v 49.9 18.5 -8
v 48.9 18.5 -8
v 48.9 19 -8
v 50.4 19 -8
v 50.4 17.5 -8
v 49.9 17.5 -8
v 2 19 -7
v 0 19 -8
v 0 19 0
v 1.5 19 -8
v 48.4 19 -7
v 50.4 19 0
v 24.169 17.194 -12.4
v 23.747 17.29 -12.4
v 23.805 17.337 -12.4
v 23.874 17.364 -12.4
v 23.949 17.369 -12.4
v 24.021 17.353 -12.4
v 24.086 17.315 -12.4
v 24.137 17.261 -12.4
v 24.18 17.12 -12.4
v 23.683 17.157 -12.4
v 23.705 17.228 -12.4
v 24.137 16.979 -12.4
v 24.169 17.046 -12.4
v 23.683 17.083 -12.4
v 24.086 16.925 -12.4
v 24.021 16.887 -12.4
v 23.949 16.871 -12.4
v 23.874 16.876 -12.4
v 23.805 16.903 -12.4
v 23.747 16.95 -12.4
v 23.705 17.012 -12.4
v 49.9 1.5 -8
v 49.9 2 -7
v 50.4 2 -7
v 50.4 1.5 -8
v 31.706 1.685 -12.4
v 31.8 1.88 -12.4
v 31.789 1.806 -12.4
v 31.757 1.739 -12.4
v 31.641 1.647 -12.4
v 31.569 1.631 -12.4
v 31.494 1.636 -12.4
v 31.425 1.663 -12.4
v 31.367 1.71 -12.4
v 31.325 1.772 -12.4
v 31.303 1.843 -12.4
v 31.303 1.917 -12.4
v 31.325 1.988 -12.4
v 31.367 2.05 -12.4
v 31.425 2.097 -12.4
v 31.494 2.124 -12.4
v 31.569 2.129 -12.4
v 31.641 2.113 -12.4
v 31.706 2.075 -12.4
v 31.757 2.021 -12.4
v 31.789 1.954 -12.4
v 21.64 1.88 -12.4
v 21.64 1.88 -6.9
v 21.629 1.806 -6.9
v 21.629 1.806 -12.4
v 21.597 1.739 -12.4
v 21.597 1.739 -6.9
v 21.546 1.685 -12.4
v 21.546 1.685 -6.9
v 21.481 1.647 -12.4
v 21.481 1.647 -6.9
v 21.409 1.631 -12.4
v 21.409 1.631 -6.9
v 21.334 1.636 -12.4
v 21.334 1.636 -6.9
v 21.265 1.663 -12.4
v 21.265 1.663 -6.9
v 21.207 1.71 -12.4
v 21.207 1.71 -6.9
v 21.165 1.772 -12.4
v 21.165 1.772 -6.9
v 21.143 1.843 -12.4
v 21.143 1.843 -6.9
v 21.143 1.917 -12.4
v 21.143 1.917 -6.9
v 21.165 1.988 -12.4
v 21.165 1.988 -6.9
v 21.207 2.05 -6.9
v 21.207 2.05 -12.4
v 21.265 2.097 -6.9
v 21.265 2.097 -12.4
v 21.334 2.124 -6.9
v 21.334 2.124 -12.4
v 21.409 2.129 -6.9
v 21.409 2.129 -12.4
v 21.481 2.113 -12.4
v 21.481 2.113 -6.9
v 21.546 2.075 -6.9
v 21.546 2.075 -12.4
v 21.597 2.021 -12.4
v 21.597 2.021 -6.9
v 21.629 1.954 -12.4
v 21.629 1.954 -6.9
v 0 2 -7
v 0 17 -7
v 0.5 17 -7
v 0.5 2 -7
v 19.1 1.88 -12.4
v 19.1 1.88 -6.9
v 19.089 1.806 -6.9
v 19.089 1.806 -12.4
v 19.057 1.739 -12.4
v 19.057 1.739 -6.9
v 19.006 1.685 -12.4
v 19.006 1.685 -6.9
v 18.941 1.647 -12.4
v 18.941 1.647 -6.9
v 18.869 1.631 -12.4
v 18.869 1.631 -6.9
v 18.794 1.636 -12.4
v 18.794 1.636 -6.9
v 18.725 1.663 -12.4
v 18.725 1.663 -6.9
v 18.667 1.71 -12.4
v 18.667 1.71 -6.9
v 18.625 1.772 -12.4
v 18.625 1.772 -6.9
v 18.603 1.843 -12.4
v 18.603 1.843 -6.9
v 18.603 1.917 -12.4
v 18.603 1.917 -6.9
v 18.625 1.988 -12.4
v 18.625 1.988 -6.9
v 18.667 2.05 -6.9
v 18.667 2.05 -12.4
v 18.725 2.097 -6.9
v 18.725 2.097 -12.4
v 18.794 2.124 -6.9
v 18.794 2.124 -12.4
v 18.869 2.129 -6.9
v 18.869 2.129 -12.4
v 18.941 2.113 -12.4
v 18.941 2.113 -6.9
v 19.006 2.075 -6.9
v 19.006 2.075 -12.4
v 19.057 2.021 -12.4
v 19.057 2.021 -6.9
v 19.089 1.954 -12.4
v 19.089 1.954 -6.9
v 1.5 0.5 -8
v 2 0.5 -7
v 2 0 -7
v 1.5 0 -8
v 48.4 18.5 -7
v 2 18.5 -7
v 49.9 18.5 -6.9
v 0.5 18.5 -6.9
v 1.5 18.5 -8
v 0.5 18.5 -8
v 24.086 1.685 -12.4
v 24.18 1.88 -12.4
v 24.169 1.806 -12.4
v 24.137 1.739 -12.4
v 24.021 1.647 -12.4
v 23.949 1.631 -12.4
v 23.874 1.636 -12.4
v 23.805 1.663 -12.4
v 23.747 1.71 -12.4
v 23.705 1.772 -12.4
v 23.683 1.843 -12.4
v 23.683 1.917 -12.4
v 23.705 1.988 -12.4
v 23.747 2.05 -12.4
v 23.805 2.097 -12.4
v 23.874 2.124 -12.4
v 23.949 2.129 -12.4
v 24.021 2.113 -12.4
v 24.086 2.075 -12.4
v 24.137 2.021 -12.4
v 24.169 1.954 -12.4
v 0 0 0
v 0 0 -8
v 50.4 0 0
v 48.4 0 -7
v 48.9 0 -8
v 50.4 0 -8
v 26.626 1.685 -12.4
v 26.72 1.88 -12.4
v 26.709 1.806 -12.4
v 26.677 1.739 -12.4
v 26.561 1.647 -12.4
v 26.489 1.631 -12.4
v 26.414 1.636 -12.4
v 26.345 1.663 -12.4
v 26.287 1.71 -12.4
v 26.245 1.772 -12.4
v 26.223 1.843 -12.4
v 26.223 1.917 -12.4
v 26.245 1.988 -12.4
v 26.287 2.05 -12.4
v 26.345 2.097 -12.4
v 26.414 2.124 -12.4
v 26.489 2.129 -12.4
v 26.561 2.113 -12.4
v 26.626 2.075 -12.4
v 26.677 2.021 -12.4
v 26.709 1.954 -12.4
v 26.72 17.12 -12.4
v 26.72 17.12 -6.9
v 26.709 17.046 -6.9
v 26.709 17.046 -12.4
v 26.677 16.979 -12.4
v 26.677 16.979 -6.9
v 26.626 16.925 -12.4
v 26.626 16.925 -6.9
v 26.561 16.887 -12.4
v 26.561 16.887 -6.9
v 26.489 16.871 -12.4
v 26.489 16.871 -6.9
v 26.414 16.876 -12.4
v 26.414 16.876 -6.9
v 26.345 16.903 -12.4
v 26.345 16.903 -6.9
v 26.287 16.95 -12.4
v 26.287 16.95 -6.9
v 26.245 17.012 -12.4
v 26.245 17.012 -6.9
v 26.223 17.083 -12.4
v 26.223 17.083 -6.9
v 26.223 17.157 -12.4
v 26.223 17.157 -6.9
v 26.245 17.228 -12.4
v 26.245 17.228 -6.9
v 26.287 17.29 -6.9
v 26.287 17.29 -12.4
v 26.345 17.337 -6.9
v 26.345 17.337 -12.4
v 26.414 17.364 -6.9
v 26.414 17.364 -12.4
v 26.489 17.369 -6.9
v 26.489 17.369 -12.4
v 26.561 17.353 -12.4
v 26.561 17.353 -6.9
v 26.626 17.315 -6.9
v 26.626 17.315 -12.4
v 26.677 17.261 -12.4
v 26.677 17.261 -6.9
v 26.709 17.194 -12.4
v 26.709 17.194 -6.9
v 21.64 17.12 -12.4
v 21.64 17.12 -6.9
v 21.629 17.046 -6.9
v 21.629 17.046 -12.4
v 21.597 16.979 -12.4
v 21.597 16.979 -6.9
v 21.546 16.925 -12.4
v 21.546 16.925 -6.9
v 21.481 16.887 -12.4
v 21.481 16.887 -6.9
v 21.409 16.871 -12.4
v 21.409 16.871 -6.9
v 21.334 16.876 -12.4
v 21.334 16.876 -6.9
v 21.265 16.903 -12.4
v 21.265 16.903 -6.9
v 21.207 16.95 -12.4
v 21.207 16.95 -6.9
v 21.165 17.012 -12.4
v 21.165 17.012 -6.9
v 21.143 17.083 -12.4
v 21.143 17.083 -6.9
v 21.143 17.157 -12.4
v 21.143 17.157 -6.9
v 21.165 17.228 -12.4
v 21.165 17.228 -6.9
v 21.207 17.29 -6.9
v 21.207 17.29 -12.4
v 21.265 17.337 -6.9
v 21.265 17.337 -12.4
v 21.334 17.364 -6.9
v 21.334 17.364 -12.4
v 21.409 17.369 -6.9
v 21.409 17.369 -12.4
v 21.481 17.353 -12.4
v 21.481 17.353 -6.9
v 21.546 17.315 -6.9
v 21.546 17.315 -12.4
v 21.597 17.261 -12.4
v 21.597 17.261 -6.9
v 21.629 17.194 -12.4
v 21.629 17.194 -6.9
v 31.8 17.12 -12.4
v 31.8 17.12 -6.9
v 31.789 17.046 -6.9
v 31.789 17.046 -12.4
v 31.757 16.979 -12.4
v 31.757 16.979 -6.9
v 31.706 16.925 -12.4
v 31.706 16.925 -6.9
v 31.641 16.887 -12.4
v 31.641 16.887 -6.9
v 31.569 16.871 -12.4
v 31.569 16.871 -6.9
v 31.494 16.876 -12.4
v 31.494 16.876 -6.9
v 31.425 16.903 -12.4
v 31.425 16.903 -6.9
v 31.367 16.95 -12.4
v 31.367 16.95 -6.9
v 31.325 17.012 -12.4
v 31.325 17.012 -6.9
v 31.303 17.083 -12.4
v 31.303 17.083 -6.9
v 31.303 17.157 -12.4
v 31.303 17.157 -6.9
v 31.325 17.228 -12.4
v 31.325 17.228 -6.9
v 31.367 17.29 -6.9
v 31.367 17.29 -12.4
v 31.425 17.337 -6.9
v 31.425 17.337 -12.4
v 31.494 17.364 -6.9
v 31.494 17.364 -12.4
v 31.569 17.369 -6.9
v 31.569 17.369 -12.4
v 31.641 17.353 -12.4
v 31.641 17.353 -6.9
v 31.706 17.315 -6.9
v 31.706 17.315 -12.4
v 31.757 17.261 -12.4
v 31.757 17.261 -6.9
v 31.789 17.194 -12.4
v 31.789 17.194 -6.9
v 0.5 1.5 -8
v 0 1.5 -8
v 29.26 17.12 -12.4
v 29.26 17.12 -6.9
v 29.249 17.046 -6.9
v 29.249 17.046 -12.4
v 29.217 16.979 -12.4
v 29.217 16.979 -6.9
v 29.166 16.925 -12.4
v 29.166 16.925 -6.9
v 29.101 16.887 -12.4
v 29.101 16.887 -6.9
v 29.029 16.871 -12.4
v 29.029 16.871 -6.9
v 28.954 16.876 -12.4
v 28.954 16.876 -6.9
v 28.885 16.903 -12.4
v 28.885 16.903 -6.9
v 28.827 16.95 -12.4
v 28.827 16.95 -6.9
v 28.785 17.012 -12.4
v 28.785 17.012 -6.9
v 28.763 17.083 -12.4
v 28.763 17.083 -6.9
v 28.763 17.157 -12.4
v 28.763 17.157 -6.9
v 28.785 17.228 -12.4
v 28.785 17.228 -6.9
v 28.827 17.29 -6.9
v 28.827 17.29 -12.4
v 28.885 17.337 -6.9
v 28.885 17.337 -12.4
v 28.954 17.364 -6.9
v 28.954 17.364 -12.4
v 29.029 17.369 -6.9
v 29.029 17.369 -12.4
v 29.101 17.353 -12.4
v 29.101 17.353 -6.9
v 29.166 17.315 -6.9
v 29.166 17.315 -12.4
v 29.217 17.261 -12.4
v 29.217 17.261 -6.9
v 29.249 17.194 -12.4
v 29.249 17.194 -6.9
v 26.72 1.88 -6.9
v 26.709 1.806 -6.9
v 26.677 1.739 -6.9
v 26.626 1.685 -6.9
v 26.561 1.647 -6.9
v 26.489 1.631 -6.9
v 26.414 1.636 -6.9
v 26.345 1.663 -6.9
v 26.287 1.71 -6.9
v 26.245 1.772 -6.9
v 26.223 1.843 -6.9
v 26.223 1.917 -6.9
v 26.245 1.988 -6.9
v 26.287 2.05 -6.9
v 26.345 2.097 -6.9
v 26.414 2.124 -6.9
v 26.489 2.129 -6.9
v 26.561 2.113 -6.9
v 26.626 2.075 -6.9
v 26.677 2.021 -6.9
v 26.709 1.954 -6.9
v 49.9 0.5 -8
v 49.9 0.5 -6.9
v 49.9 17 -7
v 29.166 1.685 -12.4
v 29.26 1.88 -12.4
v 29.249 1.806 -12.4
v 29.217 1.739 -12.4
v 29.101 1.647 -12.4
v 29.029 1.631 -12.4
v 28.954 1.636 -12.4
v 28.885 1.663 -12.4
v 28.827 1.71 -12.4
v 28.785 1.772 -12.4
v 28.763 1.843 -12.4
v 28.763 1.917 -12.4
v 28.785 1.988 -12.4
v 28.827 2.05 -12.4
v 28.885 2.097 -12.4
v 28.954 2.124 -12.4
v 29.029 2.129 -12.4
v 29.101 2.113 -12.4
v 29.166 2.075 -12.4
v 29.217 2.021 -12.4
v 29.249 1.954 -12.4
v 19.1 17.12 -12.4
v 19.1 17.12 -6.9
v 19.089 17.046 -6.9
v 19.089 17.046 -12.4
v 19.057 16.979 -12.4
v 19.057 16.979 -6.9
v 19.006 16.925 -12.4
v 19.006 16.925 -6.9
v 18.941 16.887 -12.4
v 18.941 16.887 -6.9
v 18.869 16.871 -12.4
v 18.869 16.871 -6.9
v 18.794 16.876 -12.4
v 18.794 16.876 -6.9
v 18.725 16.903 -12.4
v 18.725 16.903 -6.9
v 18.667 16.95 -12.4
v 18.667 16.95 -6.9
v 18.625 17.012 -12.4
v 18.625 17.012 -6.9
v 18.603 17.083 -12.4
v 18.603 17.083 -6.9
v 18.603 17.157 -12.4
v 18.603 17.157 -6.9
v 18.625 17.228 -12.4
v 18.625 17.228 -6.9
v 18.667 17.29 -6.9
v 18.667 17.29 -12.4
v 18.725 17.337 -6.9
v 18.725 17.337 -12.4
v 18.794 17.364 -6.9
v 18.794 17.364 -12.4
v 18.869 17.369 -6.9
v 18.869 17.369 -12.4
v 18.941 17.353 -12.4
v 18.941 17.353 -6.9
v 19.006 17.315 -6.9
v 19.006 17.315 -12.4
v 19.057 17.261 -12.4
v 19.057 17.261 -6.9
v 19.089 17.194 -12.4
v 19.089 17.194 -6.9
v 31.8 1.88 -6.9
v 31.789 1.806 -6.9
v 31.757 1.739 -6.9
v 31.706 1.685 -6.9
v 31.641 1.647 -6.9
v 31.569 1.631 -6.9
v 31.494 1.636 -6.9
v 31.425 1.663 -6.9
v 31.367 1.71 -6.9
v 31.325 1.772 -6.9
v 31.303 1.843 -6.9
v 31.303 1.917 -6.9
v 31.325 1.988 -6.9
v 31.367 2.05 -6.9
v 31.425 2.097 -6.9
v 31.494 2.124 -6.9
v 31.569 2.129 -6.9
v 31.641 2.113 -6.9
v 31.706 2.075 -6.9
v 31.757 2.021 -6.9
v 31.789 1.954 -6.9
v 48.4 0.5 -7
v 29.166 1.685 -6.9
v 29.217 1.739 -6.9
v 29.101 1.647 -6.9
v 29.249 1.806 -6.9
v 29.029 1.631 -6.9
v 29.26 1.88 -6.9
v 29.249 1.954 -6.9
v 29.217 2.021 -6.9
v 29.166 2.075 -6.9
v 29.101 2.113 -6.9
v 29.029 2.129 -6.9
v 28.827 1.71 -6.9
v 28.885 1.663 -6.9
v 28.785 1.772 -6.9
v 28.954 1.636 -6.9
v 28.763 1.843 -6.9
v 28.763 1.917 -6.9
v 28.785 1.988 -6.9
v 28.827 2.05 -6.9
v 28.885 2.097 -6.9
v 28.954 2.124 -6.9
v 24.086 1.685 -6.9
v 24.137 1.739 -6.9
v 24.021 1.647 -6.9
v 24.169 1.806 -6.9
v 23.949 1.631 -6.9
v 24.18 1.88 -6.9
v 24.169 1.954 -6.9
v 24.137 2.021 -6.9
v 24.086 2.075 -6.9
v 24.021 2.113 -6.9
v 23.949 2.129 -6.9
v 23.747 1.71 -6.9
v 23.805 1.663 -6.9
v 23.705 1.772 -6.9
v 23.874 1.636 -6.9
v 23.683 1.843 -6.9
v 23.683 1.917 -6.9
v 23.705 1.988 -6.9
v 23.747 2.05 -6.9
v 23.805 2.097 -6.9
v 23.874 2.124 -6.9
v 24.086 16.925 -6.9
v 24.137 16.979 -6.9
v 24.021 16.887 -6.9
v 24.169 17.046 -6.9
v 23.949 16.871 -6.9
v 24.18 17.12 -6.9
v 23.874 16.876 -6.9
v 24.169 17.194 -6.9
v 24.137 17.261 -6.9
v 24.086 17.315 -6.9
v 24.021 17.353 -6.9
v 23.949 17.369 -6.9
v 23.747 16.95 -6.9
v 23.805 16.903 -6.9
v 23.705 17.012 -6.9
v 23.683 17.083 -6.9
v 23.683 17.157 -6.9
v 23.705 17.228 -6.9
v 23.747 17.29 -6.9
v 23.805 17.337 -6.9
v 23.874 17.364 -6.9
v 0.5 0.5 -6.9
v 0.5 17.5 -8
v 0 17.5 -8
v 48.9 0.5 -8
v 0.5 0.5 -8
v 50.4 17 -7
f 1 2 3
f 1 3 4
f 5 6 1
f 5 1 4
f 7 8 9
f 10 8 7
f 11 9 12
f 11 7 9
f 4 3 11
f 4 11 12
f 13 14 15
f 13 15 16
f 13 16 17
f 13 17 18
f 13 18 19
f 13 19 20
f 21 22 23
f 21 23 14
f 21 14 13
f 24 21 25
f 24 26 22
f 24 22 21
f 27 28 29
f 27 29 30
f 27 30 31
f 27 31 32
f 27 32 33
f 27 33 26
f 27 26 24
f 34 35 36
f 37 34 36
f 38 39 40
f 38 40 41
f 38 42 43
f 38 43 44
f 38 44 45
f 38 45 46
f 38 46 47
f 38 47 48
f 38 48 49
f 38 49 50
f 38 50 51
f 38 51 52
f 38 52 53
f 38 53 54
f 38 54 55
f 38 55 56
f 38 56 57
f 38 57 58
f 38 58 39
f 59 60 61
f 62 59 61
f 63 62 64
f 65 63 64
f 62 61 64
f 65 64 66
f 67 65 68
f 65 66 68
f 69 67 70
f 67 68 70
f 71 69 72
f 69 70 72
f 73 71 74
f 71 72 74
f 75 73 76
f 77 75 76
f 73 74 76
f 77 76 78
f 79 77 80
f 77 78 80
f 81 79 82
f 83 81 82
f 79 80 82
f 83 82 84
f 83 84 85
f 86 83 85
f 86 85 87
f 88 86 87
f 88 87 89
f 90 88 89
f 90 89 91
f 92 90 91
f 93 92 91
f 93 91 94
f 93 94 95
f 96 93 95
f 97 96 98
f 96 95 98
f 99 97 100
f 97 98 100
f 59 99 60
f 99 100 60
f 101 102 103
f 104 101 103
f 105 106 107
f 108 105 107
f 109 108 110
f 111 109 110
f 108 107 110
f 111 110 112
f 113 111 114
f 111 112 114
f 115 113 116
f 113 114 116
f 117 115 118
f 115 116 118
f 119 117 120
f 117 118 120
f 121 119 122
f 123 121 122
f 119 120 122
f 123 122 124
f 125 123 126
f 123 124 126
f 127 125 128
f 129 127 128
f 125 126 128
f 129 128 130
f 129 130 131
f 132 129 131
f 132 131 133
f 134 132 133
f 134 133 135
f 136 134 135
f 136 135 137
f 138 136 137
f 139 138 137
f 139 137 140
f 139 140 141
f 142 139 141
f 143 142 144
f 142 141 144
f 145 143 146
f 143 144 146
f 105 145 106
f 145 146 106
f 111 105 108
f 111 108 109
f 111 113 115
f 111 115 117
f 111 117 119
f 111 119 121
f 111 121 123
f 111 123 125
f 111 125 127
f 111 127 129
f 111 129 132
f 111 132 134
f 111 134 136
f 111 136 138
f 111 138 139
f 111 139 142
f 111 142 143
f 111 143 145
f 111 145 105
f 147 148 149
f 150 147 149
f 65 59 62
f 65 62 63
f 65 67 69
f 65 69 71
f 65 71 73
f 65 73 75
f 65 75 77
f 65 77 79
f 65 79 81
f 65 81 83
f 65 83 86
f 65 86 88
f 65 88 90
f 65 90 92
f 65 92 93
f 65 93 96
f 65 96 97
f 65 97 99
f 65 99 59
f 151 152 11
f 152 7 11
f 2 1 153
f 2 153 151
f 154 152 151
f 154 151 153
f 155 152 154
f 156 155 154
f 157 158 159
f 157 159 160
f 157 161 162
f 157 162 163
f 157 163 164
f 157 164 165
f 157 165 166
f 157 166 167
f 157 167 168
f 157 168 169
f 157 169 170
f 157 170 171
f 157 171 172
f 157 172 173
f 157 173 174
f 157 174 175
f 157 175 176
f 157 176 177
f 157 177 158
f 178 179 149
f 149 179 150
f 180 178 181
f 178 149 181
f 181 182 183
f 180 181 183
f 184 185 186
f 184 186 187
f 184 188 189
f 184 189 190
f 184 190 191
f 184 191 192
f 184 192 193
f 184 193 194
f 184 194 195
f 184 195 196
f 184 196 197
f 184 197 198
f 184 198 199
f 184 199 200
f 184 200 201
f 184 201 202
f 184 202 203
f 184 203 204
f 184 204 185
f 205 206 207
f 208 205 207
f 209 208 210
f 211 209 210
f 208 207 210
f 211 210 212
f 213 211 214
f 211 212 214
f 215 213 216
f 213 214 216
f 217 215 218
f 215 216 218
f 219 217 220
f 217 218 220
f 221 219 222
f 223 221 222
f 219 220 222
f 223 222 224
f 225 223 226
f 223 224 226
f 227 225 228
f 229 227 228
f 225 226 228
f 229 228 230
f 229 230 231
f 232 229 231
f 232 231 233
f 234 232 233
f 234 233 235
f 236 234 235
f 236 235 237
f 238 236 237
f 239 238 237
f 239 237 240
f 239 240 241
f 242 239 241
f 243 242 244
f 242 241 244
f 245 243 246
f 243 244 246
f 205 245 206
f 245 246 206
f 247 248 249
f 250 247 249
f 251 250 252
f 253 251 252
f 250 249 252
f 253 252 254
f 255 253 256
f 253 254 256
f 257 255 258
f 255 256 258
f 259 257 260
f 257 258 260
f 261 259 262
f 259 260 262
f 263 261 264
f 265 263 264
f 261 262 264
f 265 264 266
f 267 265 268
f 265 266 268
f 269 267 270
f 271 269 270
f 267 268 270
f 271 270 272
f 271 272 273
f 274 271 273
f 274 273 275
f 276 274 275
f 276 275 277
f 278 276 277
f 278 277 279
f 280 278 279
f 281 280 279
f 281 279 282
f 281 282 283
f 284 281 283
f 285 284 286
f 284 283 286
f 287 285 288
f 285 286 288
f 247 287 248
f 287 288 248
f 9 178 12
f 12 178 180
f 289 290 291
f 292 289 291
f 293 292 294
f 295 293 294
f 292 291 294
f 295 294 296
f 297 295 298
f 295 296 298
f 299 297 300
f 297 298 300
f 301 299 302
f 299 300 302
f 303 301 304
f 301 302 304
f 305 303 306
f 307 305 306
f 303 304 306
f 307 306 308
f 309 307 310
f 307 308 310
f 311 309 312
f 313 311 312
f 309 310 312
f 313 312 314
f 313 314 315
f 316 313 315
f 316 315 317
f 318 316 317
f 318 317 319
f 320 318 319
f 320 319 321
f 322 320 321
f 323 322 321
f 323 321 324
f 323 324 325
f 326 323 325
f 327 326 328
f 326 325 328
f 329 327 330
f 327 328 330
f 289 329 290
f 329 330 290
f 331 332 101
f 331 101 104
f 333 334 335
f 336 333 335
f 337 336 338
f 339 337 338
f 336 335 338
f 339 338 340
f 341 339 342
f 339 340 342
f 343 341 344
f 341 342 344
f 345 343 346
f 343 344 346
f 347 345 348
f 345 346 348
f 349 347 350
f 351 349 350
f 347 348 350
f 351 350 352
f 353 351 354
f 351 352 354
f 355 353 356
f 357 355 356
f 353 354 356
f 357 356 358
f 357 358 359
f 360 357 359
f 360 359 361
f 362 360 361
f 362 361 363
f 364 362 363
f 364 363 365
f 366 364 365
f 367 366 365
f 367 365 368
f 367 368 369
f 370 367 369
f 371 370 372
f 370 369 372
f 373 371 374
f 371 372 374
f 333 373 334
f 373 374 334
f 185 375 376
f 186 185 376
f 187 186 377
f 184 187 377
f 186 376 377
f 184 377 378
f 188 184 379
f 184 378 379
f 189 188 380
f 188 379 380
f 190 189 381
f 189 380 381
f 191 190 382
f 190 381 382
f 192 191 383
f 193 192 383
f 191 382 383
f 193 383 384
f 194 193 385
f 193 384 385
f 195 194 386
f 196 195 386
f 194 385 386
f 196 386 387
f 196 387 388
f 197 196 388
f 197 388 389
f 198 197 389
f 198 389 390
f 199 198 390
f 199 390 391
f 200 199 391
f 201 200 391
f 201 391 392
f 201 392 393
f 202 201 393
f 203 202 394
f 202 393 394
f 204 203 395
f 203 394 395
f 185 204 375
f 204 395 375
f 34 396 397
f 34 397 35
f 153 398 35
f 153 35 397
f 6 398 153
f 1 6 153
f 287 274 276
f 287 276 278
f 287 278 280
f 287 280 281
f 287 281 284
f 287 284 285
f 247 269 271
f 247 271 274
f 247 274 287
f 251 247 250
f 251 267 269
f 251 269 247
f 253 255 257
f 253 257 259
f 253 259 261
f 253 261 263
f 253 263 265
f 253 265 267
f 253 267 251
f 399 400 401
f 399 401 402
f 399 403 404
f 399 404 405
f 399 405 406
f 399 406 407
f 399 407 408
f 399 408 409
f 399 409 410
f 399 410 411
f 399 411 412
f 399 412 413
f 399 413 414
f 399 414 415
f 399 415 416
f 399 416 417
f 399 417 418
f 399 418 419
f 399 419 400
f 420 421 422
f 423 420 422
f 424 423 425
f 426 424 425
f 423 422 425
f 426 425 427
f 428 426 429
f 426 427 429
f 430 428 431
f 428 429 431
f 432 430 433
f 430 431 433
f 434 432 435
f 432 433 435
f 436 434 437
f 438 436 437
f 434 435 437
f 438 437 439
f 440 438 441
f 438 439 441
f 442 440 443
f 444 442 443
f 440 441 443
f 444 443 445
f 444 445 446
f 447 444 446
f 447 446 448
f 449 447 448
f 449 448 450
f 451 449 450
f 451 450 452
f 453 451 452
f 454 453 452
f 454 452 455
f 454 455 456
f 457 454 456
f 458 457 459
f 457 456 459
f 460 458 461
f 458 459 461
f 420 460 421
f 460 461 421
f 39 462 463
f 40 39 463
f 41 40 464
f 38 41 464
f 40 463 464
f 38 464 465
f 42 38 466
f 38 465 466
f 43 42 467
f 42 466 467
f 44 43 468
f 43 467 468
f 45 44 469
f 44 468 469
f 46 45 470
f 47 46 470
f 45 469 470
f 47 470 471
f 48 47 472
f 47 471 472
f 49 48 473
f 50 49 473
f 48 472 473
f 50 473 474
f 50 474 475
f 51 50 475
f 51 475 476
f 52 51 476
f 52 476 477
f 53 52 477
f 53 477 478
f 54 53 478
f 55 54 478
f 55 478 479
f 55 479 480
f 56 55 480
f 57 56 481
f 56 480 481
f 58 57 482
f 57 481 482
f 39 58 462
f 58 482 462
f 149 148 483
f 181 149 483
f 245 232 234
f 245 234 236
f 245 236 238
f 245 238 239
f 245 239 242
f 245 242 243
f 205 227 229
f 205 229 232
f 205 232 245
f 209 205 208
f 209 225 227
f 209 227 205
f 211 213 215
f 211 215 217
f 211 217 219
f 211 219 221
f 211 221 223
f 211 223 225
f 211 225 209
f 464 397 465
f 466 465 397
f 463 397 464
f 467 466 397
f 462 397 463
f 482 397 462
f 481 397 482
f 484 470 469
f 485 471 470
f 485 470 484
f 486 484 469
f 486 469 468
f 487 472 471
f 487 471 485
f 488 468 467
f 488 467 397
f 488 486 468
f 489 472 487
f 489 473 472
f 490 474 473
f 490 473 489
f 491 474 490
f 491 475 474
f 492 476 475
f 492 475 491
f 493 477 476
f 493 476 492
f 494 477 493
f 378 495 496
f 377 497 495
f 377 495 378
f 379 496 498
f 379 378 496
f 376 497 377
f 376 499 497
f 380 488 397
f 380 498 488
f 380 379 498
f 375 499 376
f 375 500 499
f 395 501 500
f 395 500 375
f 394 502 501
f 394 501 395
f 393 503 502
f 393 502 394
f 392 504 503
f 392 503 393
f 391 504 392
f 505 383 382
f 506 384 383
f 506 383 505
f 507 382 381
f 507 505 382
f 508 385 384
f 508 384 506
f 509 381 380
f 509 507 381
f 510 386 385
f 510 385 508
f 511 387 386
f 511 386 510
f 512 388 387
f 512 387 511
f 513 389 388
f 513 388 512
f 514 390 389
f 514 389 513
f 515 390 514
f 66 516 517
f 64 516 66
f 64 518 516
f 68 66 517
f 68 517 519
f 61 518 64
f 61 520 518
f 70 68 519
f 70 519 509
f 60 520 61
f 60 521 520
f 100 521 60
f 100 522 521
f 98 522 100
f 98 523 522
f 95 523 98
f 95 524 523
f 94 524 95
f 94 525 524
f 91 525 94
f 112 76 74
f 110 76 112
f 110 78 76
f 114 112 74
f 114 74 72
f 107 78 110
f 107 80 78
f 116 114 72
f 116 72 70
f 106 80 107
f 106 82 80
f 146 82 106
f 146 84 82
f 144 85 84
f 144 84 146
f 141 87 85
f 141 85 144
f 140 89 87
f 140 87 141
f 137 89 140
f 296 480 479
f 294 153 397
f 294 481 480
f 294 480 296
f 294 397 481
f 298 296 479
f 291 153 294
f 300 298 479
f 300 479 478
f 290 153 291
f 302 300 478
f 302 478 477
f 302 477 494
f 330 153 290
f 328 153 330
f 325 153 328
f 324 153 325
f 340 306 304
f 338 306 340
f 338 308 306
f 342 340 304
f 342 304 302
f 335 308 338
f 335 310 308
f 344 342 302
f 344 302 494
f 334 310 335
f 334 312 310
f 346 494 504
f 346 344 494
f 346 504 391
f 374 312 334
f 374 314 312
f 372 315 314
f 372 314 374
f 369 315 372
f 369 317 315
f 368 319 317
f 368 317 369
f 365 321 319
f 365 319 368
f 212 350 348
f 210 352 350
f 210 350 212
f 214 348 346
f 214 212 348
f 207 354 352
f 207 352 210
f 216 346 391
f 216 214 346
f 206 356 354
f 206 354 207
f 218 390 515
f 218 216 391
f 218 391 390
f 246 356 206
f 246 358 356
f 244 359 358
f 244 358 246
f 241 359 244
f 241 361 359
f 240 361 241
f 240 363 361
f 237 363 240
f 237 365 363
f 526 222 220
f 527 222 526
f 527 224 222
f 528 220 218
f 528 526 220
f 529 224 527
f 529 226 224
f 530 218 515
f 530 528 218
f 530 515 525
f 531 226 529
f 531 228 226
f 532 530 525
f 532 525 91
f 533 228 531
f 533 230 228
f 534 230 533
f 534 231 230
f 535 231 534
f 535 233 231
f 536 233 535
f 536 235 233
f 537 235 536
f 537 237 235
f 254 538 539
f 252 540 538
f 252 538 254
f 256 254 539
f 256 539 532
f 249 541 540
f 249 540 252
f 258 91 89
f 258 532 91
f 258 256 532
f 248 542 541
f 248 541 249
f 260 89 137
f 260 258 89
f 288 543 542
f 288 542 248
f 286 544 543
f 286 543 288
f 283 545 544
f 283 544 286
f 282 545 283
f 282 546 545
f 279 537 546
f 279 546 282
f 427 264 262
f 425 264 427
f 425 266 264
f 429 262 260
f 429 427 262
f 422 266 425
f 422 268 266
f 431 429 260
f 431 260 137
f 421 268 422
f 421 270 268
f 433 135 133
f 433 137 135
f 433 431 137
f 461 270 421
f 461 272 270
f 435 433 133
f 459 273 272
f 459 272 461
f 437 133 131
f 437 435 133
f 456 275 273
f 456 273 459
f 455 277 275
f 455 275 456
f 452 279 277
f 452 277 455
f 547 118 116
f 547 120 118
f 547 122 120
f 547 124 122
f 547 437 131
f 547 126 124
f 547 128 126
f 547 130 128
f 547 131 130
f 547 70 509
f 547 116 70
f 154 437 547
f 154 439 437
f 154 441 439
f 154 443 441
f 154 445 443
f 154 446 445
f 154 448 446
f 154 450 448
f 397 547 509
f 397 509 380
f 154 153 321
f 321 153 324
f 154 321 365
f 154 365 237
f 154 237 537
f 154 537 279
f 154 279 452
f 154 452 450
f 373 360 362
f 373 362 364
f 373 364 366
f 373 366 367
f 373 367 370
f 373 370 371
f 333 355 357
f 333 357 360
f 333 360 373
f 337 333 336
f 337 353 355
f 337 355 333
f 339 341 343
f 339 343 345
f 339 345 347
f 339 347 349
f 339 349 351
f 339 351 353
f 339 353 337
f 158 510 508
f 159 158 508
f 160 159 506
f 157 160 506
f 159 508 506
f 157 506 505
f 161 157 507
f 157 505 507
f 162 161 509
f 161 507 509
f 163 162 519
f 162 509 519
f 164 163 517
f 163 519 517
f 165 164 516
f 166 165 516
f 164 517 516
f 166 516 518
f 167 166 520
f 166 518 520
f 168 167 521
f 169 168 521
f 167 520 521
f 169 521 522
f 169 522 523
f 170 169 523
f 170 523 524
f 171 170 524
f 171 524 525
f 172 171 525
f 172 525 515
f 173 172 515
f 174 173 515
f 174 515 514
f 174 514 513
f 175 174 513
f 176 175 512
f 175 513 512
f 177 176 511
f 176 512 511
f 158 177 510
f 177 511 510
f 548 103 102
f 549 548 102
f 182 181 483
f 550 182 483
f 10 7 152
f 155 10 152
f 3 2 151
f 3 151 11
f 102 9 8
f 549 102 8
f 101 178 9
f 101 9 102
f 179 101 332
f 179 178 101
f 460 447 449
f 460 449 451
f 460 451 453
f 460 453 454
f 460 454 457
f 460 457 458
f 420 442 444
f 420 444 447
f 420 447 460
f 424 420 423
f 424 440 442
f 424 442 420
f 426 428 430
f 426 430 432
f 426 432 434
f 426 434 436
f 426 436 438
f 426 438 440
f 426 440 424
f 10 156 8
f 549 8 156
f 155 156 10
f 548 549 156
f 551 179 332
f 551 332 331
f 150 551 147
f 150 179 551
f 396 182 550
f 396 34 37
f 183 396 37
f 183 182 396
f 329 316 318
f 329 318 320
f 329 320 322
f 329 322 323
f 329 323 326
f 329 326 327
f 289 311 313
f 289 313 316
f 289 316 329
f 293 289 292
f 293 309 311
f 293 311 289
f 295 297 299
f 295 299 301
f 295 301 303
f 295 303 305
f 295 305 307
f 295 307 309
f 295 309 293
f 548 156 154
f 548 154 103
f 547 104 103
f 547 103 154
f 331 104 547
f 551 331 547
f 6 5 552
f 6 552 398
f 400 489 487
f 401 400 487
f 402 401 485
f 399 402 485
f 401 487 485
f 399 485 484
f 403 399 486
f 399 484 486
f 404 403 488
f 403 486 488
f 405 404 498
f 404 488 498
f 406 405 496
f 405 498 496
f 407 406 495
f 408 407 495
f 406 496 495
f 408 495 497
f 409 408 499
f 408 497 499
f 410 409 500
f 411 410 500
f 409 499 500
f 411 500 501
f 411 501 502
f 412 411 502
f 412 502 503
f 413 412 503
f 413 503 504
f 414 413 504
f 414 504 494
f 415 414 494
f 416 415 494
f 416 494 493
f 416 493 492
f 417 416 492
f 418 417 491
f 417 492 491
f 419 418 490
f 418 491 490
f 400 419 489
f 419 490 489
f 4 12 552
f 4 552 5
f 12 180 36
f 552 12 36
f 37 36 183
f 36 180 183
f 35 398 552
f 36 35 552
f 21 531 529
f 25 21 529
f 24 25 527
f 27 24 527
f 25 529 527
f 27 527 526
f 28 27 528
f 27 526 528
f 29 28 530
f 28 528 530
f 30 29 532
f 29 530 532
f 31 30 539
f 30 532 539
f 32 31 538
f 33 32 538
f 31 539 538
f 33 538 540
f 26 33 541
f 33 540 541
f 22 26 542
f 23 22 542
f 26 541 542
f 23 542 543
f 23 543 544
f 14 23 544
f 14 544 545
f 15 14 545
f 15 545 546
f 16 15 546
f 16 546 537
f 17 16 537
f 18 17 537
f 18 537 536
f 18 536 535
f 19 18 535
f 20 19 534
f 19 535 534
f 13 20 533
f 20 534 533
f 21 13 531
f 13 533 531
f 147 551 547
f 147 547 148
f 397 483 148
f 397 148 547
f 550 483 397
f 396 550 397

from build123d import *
from OCP.BRepFilletAPI import BRepFilletAPI_MakeChamfer

# Parameters (mm, degrees)
SKETCH1_W           = 50.4
SKETCH1_H           = 8
BOSS_EXTRUDE1_DEPTH = 19
CUT_EXTRUDE1_DEPTH  = 1
CHAMFER1_SIZE       = 0.5
CHAMFER1_SIZE_2     = 1
SKETCH3_W           = 49.4
SKETCH3_H           = 18
CUT_EXTRUDE2_DEPTH  = 0.1
SKETCH4_R           = 0.25
BOSS_EXTRUDE2_DEPTH = 5.5


with BuildPart() as part:
    # Sketch1 → Boss-Extrude1 (new body)
    with BuildSketch(Plane(origin=(0, 0, 0), x_dir=(1, 0, 0), z_dir=(0, 1, 0))):
        with Locations((25.2, 4)):
            Rectangle(SKETCH1_W, SKETCH1_H)
    extrude(amount=BOSS_EXTRUDE1_DEPTH)

    # Sketch2 → Cut-Extrude1 (cut)
    with BuildSketch(Plane(origin=(0, 0, -8), x_dir=(-1, 0, 0), z_dir=(0, 0, -1))):
        Polygon((-50.4, 17), (-49.9, 17), (-49.9, 18.5), (-48.4, 18.5), (-48.4, 19), (-2, 19), (-2, 18.5), (-0.5, 18.5), (-0.5, 17), (0, 17), (0, 2), (-0.5, 2), (-0.5, 0.5), (-2, 0.5), (-2, 0), (-48.4, 0), (-48.4, 0.5), (-49.9, 0.5), (-49.9, 2), (-50.4, 2), align=None)
    extrude(amount=-CUT_EXTRUDE1_DEPTH, mode=Mode.SUBTRACT)

    # Chamfer1
    chamfer1_edges_1 = [part.edges().sort_by_distance(p)[0] for p in [
        (50.15, 2, -8),
    ]]
    chamfer1_side_1 = [part.faces().sort_by_distance(p)[0] for p in [
        (50.15, 1.99, -8),
    ]]
    chamfer1_edges_2 = [part.edges().sort_by_distance(p)[0] for p in [
        (48.4, 0.25, -8),
    ]]
    chamfer1_side_2 = [part.faces().sort_by_distance(p)[0] for p in [
        (48.41, 0.25, -8),
    ]]
    chamfer1_edges_3 = [part.edges().sort_by_distance(p)[0] for p in [
        (2, 0.25, -8),
    ]]
    chamfer1_side_3 = [part.faces().sort_by_distance(p)[0] for p in [
        (1.99, 0.25, -8),
    ]]
    chamfer1_edges_4 = [part.edges().sort_by_distance(p)[0] for p in [
        (0.25, 2, -8),
    ]]
    chamfer1_side_4 = [part.faces().sort_by_distance(p)[0] for p in [
        (0.25, 2, -7.99),
    ]]
    chamfer1_edges_5 = [part.edges().sort_by_distance(p)[0] for p in [
        (2, 18.75, -8),
    ]]
    chamfer1_side_5 = [part.faces().sort_by_distance(p)[0] for p in [
        (1.99, 18.75, -8),
    ]]
    chamfer1_edges_6 = [part.edges().sort_by_distance(p)[0] for p in [
        (0.25, 17, -8),
    ]]
    chamfer1_side_6 = [part.faces().sort_by_distance(p)[0] for p in [
        (0.25, 17.01, -8),
    ]]
    chamfer1_edges_7 = [part.edges().sort_by_distance(p)[0] for p in [
        (48.4, 18.75, -8),
    ]]
    chamfer1_side_7 = [part.faces().sort_by_distance(p)[0] for p in [
        (48.41, 18.75, -8),
    ]]
    chamfer1_edges_8 = [part.edges().sort_by_distance(p)[0] for p in [
        (50.15, 17, -8),
    ]]
    chamfer1_side_8 = [part.faces().sort_by_distance(p)[0] for p in [
        (50.15, 17, -7.99),
    ]]
    chamfer1 = BRepFilletAPI_MakeChamfer(part.part.solid().wrapped)
    for e in chamfer1_edges_1:
        chamfer1.Add(CHAMFER1_SIZE - 0.0001, CHAMFER1_SIZE_2 - 0.0001, e.wrapped, chamfer1_side_1[0].wrapped)
    for e in chamfer1_edges_2:
        chamfer1.Add(CHAMFER1_SIZE - 0.0001, CHAMFER1_SIZE_2 - 0.0001, e.wrapped, chamfer1_side_2[0].wrapped)
    for e in chamfer1_edges_3:
        chamfer1.Add(CHAMFER1_SIZE - 0.0001, CHAMFER1_SIZE_2 - 0.0001, e.wrapped, chamfer1_side_3[0].wrapped)
    for e in chamfer1_edges_4:
        chamfer1.Add(CHAMFER1_SIZE_2 - 0.0001, CHAMFER1_SIZE - 0.0001, e.wrapped, chamfer1_side_4[0].wrapped)
    for e in chamfer1_edges_5:
        chamfer1.Add(CHAMFER1_SIZE - 0.0001, CHAMFER1_SIZE_2 - 0.0001, e.wrapped, chamfer1_side_5[0].wrapped)
    for e in chamfer1_edges_6:
        chamfer1.Add(CHAMFER1_SIZE - 0.0001, CHAMFER1_SIZE_2 - 0.0001, e.wrapped, chamfer1_side_6[0].wrapped)
    for e in chamfer1_edges_7:
        chamfer1.Add(CHAMFER1_SIZE - 0.0001, CHAMFER1_SIZE_2 - 0.0001, e.wrapped, chamfer1_side_7[0].wrapped)
    for e in chamfer1_edges_8:
        chamfer1.Add(CHAMFER1_SIZE_2 - 0.0001, CHAMFER1_SIZE - 0.0001, e.wrapped, chamfer1_side_8[0].wrapped)
    add(Compound.cast(chamfer1.Shape()), mode=Mode.REPLACE)  # a hair under: the kernel refuses the full size

    # Sketch3 → Cut-Extrude2 (cut)
    with BuildSketch(Plane(origin=(0, 0, -7), x_dir=(-1, 0, 0), z_dir=(0, 0, -1))):
        with Locations((-25.2, 9.5)):
            Rectangle(SKETCH3_W, SKETCH3_H)
    extrude(amount=-CUT_EXTRUDE2_DEPTH, mode=Mode.SUBTRACT)

    # Sketch4 → Boss-Extrude2 (add)
    with BuildSketch(Plane(origin=(0, 0, -6.9), x_dir=(-1, 0, 0), z_dir=(0, 0, -1))):
        with Locations(Location((-31.55, 17.12, 0), (0, 0, 180))):
            Circle(SKETCH4_R)
        with Locations(Location((-29.01, 17.12, 0), (0, 0, 180))):
            Circle(SKETCH4_R)
        with Locations(Location((-26.47, 17.12, 0), (0, 0, 180))):
            Circle(SKETCH4_R)
        with Locations(Location((-23.93, 17.12, 0), (0, 0, 180))):
            Circle(SKETCH4_R)
        with Locations(Location((-21.39, 17.12, 0), (0, 0, 180))):
            Circle(SKETCH4_R)
        with Locations(Location((-18.85, 17.12, 0), (0, 0, 180))):
            Circle(SKETCH4_R)
        with Locations(Location((-31.55, 1.88, 0), (0, 0, 180))):
            Circle(SKETCH4_R)
        with Locations(Location((-29.01, 1.88, 0), (0, 0, 180))):
            Circle(SKETCH4_R)
        with Locations(Location((-26.47, 1.88, 0), (0, 0, 180))):
            Circle(SKETCH4_R)
        with Locations(Location((-23.93, 1.88, 0), (0, 0, 180))):
            Circle(SKETCH4_R)
        with Locations(Location((-21.39, 1.88, 0), (0, 0, 180))):
            Circle(SKETCH4_R)
        with Locations(Location((-18.85, 1.88, 0), (0, 0, 180))):
            Circle(SKETCH4_R)
    extrude(amount=BOSS_EXTRUDE2_DEPTH)


solid = part.part
